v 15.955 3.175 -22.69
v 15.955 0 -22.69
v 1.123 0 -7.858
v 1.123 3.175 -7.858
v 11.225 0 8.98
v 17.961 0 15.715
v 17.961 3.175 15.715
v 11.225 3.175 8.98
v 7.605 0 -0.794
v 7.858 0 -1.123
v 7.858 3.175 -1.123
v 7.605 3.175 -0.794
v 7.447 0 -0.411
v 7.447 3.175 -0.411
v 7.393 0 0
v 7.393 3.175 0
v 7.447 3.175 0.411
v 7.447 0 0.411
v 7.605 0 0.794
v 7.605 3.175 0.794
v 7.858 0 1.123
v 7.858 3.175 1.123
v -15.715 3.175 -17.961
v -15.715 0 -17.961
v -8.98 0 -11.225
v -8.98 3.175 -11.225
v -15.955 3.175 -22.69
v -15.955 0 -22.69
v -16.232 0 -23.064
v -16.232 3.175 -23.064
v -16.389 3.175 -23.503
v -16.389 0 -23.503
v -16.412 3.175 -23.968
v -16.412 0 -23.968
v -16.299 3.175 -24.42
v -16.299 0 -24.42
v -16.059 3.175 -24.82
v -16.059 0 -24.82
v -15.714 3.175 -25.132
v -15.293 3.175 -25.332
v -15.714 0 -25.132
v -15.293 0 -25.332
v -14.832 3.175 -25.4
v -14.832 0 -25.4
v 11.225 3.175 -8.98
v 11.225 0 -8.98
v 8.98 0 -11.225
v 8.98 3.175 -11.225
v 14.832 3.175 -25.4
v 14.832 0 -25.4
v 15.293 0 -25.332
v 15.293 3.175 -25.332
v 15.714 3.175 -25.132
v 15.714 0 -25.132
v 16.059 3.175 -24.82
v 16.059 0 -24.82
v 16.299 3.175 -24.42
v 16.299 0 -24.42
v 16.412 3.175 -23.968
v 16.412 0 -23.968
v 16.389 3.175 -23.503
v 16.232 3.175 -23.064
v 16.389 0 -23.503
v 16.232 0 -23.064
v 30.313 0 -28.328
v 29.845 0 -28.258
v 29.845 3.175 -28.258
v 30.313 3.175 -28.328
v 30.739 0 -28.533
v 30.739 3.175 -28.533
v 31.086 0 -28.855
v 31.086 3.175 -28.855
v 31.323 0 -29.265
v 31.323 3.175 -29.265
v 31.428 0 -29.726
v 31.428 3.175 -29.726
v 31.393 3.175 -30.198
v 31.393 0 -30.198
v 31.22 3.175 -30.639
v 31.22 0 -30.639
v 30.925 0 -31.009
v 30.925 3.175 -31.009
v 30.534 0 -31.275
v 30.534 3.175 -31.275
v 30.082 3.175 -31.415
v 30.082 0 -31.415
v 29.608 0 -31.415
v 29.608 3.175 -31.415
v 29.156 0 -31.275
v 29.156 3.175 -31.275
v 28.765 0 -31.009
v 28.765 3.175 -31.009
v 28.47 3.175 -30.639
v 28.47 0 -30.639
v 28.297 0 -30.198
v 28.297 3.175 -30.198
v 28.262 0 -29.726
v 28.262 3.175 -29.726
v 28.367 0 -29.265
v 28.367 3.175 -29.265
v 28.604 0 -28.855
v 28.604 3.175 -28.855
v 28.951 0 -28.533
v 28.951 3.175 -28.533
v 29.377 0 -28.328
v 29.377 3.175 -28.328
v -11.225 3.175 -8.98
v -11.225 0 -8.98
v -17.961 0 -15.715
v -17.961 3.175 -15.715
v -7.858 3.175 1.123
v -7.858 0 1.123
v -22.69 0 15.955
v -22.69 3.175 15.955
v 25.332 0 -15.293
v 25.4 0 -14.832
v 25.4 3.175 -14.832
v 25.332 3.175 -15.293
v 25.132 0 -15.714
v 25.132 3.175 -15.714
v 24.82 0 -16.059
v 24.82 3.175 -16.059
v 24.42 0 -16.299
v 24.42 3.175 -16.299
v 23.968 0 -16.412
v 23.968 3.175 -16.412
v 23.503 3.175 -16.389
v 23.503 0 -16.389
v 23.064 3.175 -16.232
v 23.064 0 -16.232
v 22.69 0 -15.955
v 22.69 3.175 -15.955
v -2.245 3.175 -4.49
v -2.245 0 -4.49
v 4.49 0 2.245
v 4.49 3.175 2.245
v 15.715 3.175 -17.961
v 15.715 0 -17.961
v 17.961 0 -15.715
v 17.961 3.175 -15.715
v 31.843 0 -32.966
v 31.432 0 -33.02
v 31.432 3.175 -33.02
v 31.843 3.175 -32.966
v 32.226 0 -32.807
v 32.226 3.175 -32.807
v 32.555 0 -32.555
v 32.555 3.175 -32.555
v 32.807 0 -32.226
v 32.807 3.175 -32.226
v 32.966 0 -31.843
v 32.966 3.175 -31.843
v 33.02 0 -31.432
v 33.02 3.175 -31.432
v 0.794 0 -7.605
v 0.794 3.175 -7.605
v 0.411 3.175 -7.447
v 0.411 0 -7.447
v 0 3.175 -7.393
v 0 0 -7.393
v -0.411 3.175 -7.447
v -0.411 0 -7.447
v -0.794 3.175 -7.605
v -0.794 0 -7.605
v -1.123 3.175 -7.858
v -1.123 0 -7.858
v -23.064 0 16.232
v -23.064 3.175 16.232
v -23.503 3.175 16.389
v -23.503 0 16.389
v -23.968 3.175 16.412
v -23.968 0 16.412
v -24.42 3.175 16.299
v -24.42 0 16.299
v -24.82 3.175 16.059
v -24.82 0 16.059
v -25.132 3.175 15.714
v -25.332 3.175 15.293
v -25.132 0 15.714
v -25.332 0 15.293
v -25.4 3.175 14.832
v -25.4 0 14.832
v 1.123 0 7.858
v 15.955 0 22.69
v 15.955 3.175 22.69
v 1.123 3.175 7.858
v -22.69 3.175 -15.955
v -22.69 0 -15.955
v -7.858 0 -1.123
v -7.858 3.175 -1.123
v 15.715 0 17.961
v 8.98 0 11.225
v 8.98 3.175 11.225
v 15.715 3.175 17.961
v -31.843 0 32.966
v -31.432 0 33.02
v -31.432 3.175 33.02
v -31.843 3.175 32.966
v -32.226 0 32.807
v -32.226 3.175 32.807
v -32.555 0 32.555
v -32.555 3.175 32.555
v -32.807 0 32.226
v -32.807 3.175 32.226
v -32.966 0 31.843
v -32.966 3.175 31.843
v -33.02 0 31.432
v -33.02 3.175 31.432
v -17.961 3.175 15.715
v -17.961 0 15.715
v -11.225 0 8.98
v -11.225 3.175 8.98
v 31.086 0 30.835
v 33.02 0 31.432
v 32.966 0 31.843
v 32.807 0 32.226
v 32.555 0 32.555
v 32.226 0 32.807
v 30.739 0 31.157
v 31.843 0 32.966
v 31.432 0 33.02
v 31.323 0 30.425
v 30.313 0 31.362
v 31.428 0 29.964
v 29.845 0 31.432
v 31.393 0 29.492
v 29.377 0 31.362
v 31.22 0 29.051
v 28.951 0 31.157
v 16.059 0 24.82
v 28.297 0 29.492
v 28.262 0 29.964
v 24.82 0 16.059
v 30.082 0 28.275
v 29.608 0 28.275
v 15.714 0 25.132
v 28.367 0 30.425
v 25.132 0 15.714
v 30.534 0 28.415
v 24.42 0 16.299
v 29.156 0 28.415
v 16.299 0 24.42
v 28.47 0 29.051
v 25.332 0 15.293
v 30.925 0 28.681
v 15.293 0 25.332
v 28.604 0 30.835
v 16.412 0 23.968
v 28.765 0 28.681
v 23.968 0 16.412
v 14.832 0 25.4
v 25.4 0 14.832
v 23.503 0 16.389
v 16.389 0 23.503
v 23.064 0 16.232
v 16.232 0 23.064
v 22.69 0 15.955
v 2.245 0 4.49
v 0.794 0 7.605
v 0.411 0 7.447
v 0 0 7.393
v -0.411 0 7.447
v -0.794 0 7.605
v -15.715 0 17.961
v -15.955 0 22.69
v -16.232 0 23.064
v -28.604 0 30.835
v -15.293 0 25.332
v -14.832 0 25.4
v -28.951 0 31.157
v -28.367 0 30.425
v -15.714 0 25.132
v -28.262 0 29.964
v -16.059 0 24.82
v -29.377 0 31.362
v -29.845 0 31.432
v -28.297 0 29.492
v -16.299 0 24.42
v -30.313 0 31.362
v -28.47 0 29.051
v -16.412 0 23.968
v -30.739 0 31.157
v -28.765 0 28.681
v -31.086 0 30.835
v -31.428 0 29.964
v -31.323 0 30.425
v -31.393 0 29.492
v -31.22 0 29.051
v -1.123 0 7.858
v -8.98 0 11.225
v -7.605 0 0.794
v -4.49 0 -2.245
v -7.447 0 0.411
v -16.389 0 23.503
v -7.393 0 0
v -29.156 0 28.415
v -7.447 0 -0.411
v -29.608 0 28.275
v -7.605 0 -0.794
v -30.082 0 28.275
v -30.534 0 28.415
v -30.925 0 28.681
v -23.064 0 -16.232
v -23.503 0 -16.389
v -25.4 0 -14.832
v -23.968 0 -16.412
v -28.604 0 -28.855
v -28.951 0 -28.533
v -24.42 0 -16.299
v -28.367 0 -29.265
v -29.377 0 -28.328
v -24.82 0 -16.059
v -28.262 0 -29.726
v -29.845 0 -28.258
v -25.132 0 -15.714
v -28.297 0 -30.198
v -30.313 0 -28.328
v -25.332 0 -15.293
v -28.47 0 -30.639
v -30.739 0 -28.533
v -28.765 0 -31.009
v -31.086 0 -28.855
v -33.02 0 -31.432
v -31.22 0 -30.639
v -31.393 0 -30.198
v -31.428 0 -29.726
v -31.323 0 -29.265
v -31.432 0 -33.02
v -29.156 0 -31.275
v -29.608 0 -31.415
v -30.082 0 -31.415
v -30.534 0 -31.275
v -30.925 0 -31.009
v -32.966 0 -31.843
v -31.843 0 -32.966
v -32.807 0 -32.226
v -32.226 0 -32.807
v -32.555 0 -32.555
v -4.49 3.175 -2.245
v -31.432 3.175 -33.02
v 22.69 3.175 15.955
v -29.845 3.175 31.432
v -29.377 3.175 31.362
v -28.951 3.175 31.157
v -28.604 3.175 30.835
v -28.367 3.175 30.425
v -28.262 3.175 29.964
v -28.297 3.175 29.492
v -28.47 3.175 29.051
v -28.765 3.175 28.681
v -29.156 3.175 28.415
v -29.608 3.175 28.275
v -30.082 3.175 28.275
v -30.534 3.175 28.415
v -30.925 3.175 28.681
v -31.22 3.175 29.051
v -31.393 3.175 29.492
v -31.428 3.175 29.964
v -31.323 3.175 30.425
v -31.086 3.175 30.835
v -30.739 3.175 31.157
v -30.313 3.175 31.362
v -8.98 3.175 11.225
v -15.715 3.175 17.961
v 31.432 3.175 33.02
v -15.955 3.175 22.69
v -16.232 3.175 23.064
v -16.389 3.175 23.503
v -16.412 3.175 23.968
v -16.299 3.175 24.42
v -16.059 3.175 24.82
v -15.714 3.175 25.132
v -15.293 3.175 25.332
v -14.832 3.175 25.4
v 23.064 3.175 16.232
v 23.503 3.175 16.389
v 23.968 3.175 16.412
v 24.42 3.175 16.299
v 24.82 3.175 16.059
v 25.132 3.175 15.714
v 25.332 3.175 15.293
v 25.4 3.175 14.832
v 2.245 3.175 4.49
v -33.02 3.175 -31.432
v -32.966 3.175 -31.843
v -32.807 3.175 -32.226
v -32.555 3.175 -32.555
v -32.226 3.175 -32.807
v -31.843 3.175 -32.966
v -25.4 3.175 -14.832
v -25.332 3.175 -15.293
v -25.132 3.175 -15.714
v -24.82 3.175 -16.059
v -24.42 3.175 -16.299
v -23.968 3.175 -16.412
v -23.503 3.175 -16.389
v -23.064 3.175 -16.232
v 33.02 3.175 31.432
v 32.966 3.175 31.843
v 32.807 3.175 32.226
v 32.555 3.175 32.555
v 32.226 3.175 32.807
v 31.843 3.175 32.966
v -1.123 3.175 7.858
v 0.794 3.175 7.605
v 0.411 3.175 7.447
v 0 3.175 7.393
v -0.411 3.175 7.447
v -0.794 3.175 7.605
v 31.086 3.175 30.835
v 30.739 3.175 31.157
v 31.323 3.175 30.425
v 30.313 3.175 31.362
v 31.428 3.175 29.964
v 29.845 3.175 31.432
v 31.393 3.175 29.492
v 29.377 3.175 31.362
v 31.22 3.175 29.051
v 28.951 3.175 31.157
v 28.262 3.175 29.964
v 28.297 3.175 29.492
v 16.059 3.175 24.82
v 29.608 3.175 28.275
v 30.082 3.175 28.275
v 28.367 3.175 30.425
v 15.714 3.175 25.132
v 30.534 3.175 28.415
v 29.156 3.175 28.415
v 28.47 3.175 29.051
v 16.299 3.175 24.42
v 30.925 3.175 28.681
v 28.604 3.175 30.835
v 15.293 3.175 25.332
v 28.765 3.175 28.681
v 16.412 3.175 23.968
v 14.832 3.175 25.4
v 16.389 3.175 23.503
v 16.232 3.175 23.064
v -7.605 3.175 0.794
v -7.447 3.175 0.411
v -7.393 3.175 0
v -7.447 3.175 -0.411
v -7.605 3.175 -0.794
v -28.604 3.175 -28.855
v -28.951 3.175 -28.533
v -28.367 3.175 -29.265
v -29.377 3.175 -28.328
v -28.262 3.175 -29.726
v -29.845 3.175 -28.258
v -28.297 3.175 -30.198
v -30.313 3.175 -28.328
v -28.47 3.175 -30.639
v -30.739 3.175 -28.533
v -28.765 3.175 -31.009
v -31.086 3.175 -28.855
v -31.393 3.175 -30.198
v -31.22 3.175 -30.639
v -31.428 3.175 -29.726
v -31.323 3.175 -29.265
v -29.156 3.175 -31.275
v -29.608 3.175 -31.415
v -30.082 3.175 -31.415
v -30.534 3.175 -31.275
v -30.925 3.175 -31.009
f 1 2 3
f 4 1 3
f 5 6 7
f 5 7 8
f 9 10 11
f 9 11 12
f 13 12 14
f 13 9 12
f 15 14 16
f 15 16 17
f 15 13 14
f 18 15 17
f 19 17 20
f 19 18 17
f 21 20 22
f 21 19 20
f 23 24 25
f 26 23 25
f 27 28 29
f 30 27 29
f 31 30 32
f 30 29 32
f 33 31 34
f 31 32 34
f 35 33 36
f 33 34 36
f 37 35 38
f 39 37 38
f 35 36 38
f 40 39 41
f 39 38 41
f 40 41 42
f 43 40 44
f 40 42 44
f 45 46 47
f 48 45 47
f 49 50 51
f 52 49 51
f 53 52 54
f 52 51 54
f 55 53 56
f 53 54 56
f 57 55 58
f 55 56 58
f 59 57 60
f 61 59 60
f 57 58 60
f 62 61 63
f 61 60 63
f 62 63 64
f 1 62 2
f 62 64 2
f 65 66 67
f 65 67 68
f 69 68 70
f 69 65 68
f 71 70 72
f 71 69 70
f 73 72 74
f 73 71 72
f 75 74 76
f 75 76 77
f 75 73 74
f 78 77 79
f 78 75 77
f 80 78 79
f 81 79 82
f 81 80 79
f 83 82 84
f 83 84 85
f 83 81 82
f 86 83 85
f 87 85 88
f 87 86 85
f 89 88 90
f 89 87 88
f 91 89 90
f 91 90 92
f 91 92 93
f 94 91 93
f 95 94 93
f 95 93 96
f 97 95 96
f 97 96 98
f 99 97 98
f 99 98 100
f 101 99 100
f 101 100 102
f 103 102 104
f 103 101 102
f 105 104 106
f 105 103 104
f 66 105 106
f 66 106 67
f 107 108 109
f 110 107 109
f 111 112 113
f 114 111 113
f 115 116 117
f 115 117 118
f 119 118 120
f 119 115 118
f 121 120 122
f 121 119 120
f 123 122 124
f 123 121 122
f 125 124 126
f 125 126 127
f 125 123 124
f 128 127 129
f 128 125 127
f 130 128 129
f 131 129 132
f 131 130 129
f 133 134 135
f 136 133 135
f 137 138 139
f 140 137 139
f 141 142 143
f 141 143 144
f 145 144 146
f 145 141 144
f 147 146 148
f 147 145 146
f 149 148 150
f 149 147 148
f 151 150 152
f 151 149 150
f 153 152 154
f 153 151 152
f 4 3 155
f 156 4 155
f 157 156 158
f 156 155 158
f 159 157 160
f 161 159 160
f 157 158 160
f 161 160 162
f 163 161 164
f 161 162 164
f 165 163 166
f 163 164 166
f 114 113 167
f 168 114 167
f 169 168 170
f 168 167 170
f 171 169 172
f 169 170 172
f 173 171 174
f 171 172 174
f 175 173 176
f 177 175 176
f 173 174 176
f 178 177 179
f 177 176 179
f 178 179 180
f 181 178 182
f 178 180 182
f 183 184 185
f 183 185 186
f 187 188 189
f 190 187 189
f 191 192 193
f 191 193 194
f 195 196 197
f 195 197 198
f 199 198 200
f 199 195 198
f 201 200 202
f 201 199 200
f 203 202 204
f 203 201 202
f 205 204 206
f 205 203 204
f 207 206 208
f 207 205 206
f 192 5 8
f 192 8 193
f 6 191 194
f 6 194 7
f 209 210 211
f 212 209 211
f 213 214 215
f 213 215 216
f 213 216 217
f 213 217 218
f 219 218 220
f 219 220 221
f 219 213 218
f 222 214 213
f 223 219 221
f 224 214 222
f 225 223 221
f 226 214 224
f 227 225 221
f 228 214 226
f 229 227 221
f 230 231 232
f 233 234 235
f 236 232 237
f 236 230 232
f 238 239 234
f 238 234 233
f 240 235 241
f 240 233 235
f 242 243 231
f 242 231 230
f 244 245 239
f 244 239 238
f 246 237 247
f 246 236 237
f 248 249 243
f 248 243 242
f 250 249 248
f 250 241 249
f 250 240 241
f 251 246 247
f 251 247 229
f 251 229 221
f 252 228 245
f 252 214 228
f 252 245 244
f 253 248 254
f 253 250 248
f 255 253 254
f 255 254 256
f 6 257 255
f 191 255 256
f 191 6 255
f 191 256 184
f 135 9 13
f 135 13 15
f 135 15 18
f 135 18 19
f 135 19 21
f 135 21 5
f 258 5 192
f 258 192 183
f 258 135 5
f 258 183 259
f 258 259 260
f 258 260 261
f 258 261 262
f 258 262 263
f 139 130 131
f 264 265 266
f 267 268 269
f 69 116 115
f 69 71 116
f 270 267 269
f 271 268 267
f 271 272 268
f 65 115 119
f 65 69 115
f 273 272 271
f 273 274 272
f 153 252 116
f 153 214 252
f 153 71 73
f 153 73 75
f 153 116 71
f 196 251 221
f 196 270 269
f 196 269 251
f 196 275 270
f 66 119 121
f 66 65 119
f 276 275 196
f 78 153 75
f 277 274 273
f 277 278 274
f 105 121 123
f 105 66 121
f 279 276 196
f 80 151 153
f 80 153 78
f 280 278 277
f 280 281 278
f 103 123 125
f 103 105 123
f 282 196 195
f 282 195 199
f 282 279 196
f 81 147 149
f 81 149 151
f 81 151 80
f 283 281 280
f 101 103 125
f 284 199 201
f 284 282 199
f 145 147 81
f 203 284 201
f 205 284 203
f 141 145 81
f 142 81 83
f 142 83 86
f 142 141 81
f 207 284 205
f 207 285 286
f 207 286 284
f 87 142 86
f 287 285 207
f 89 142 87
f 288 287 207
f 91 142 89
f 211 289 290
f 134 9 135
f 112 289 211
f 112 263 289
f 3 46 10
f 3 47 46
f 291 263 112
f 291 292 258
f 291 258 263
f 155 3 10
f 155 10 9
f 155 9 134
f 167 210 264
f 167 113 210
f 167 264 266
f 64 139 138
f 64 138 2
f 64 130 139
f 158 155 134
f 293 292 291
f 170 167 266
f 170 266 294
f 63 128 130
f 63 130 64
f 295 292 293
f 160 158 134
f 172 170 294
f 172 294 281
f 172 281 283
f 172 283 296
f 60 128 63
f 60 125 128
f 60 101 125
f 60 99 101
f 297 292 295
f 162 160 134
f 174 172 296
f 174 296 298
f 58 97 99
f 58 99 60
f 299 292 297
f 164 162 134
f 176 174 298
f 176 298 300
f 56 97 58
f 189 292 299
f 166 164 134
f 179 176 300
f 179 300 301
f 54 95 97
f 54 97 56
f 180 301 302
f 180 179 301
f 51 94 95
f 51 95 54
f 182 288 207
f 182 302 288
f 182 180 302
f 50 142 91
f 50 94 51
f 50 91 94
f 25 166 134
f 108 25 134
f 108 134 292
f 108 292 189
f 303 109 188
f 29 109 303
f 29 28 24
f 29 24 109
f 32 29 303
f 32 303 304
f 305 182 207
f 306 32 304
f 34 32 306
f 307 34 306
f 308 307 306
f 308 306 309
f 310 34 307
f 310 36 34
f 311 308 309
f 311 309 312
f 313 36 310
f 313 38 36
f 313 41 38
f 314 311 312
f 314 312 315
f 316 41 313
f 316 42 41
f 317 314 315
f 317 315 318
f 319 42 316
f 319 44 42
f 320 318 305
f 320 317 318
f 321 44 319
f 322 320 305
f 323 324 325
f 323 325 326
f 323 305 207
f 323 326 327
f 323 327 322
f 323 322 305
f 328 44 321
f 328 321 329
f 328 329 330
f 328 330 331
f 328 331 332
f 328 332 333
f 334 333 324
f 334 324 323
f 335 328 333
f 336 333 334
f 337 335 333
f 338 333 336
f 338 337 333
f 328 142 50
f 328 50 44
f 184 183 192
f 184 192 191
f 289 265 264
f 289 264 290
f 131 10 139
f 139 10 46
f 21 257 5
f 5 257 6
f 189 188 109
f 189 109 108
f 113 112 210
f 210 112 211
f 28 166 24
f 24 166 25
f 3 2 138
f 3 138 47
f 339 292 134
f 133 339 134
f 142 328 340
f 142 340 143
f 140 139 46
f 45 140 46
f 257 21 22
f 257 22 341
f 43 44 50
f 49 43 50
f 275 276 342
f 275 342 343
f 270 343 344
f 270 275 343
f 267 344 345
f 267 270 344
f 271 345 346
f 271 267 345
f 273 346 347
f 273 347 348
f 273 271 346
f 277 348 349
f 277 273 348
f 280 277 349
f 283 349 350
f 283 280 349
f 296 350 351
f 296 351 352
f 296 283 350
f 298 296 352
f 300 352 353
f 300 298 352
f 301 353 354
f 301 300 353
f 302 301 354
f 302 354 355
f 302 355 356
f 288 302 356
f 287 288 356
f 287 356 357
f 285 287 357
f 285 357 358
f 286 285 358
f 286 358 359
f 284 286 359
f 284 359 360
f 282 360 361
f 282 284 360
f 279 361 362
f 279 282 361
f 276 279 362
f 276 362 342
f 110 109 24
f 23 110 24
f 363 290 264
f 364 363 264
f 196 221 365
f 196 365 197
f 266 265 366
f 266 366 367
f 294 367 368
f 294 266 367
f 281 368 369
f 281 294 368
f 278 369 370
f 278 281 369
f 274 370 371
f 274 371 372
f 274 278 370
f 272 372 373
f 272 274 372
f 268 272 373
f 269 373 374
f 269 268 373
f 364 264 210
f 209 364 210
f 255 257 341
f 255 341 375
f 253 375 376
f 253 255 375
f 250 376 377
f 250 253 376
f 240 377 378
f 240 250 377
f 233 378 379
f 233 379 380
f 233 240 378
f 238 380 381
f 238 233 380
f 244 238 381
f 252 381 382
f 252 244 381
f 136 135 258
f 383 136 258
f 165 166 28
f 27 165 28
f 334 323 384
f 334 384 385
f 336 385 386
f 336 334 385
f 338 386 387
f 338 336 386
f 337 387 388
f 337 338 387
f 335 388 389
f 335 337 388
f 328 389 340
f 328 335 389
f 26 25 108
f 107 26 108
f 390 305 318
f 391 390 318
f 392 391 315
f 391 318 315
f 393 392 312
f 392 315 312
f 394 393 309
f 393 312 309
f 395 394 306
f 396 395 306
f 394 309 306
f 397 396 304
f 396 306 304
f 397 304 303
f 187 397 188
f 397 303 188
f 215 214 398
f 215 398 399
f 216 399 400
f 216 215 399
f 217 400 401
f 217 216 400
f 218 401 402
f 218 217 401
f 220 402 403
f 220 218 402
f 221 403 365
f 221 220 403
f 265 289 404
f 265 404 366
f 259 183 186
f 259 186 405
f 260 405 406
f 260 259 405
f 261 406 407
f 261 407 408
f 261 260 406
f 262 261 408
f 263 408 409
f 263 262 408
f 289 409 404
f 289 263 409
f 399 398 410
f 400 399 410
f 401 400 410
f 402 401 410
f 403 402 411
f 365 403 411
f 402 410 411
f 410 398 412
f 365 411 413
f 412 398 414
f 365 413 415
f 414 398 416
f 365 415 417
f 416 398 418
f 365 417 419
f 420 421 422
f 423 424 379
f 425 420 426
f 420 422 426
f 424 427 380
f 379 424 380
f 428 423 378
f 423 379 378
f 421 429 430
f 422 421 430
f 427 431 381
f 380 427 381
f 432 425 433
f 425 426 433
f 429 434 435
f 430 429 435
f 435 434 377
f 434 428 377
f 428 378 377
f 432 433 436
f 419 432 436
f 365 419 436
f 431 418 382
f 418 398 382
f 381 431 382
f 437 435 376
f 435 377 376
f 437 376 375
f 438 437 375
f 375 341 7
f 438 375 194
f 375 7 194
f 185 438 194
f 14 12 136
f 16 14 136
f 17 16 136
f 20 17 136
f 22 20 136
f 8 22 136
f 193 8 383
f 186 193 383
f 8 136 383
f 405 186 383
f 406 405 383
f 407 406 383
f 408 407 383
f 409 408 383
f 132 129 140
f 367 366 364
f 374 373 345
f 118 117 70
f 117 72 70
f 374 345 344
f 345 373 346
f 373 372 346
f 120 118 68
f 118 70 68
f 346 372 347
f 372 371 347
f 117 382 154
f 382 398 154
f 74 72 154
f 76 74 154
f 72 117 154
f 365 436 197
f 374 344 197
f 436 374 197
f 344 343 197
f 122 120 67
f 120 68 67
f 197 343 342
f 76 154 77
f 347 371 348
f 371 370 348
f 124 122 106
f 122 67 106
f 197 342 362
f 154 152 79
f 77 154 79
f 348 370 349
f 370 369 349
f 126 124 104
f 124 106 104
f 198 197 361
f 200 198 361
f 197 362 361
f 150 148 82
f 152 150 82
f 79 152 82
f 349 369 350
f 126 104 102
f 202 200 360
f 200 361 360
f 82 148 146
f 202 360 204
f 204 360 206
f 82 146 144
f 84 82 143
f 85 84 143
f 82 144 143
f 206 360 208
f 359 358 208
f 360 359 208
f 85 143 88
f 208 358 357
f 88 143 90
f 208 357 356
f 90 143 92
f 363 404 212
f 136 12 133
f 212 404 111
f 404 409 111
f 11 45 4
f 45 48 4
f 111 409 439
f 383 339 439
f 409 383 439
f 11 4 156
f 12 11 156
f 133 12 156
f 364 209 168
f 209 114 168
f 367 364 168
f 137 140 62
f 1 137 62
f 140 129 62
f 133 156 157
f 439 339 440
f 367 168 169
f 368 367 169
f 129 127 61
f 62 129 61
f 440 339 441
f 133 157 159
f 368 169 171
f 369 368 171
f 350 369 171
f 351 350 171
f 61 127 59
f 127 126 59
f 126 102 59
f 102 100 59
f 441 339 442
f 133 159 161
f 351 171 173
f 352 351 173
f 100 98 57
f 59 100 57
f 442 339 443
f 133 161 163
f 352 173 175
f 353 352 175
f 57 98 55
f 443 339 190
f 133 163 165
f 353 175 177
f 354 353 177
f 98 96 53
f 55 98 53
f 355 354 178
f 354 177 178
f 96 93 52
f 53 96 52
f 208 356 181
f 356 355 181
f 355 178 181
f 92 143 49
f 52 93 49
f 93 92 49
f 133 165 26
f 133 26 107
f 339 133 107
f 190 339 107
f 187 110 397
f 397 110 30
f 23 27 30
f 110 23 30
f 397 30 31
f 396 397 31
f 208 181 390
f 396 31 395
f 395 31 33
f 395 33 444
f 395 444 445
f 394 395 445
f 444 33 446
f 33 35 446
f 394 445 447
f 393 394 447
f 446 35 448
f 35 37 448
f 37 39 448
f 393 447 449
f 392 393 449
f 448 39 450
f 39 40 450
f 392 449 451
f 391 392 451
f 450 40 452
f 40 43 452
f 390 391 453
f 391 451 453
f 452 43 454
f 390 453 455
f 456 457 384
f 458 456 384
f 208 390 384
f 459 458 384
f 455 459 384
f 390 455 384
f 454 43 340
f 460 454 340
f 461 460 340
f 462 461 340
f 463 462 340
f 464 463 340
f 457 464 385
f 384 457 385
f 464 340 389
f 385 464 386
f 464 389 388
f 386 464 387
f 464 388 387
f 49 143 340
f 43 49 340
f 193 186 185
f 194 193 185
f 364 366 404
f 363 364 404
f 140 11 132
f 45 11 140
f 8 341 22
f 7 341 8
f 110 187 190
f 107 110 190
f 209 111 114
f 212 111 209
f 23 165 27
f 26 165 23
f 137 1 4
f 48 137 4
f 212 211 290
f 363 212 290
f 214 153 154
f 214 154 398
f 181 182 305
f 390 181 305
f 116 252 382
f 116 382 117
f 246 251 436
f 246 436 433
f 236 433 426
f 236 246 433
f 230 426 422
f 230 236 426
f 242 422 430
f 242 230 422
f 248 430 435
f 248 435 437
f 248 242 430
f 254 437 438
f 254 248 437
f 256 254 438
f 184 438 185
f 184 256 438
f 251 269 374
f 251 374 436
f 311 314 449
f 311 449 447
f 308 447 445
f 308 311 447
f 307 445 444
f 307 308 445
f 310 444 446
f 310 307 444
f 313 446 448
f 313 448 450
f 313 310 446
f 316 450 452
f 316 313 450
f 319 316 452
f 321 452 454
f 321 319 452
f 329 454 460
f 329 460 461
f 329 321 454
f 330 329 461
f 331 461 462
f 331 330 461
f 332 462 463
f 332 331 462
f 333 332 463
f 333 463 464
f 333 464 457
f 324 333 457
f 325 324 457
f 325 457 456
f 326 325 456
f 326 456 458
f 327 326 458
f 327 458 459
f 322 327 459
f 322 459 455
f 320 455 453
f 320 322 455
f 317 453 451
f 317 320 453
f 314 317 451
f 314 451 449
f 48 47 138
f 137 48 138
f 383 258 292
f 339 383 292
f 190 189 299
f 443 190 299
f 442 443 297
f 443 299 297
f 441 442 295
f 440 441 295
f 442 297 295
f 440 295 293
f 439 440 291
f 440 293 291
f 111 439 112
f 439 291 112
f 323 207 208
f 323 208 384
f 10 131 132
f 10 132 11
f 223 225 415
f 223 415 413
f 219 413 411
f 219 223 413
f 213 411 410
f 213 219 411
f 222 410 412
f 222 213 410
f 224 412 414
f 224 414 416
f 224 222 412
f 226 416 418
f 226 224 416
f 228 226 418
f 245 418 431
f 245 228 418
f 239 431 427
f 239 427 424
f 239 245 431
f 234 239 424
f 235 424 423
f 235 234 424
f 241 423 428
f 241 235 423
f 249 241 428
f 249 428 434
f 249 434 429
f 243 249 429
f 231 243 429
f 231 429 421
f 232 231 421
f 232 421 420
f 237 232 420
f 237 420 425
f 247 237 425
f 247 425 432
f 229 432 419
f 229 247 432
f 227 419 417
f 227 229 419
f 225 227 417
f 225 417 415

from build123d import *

# Parameters (mm, degrees)
SKETCH1_R           = 1.5875
BOSS_EXTRUDE1_DEPTH = 3.175


with BuildPart() as part:
    # Sketch1 → Boss-Extrude1 (new body)
    with BuildSketch(Plane(origin=(0, 0, 0), x_dir=(1, 0, 0), z_dir=(0, 1, 0))):
        with BuildLine():
            Line((-31.4325, 33.02), (31.4325, 33.02))
            ThreePointArc((31.4325, 33.02), (32.555032015, 32.555032015), (33.02, 31.4325))
            Line((33.02, 31.4325), (33.02, -31.4325))
            ThreePointArc((33.02, -31.4325), (32.555032015, -32.555032015), (31.4325, -33.02))
            Line((31.4325, -33.02), (-31.4325, -33.02))
            ThreePointArc((-31.4325, -33.02), (-32.555032015, -32.555032015), (-33.02, -31.4325))
            Line((-33.02, -31.4325), (-33.02, 31.4325))
            ThreePointArc((-33.02, 31.4325), (-32.555032015, 32.555032015), (-31.4325, 33.02))
        make_face()
        with Locations(Location((-29.845, 29.845, 0), (0, 0, 270))):
            Circle(SKETCH1_R, mode=Mode.SUBTRACT)
        with Locations(Location((29.845, 29.845, 0), (0, 0, 270))):
            Circle(SKETCH1_R, mode=Mode.SUBTRACT)
        with Locations(Location((29.845, -29.845, 0), (0, 0, 270))):
            Circle(SKETCH1_R, mode=Mode.SUBTRACT)
        with Locations(Location((-29.845, -29.845, 0), (0, 0, 270))):
            Circle(SKETCH1_R, mode=Mode.SUBTRACT)
        with BuildLine():
            Line((-14.832243879, 25.4), (14.832243879, 25.4))
            ThreePointArc((14.832243879, 25.4), (16.298902637, 24.420009949), (15.954775894, 22.689967985))
            Line((15.954775894, 22.689967985), (1.122532015, 7.857724106))
            ThreePointArc((1.122532015, 7.857724106), (0, 7.392756121), (-1.122532015, 7.857724106))
            Line((-1.122532015, 7.857724106), (-15.954775894, 22.689967985))
            ThreePointArc((-15.954775894, 22.689967985), (-16.298902637, 24.420009949), (-14.832243879, 25.4))
        make_face(mode=Mode.SUBTRACT)
        Polygon((15.715448212, -17.960512242), (17.960512242, -15.715448212), (11.225320151, -8.980256121), (8.980256121, -11.225320151), align=None, mode=Mode.SUBTRACT)
        with BuildLine():
            Line((-14.832243879, -25.4), (14.832243879, -25.4))
            ThreePointArc((14.832243879, -25.4), (16.298902637, -24.420009949), (15.954775894, -22.689967985))
            Line((15.954775894, -22.689967985), (1.122532015, -7.857724106))
            ThreePointArc((1.122532015, -7.857724106), (0, -7.392756121), (-1.122532015, -7.857724106))
            Line((-1.122532015, -7.857724106), (-15.954775894, -22.689967985))
            ThreePointArc((-15.954775894, -22.689967985), (-16.298902637, -24.420009949), (-14.832243879, -25.4))
        make_face(mode=Mode.SUBTRACT)
        Polygon((-15.715448212, 17.960512242), (-8.980256121, 11.225320151), (-11.225320151, 8.980256121), (-17.960512242, 15.715448212), align=None, mode=Mode.SUBTRACT)
        Polygon((-17.960512242, -15.715448212), (-11.225320151, -8.980256121), (-8.980256121, -11.225320151), (-15.715448212, -17.960512242), align=None, mode=Mode.SUBTRACT)
        with BuildLine():
            Line((-22.689967985, 15.954775894), (-7.857724106, 1.122532015))
            ThreePointArc((-7.857724106, 1.122532015), (-7.392756121, 0), (-7.857724106, -1.122532015))
            Line((-7.857724106, -1.122532015), (-22.689967985, -15.954775894))
            ThreePointArc((-22.689967985, -15.954775894), (-24.420009949, -16.298902637), (-25.4, -14.832243879))
            Line((-25.4, -14.832243879), (-25.4, 14.832243879))
            ThreePointArc((-25.4, 14.832243879), (-24.420009949, 16.298902637), (-22.689967985, 15.954775894))
        make_face(mode=Mode.SUBTRACT)
        Polygon((-4.490128061, 2.24506403), (-2.24506403, 4.490128061), (4.490128061, -2.24506403), (2.24506403, -4.490128061), align=None, mode=Mode.SUBTRACT)
        Polygon((8.980256121, 11.225320151), (15.715448212, 17.960512242), (17.960512242, 15.715448212), (11.225320151, 8.980256121), align=None, mode=Mode.SUBTRACT)
        with BuildLine():
            Line((25.4, -14.832243879), (25.4, 14.832243879))
            ThreePointArc((25.4, 14.832243879), (24.420009949, 16.298902637), (22.689967985, 15.954775894))
            Line((22.689967985, 15.954775894), (7.857724106, 1.122532015))
            ThreePointArc((7.857724106, 1.122532015), (7.392756121, 0), (7.857724106, -1.122532015))
            Line((7.857724106, -1.122532015), (22.689967985, -15.954775894))
            ThreePointArc((22.689967985, -15.954775894), (24.420009949, -16.298902637), (25.4, -14.832243879))
        make_face(mode=Mode.SUBTRACT)
    extrude(amount=BOSS_EXTRUDE1_DEPTH)


solid = part.part
